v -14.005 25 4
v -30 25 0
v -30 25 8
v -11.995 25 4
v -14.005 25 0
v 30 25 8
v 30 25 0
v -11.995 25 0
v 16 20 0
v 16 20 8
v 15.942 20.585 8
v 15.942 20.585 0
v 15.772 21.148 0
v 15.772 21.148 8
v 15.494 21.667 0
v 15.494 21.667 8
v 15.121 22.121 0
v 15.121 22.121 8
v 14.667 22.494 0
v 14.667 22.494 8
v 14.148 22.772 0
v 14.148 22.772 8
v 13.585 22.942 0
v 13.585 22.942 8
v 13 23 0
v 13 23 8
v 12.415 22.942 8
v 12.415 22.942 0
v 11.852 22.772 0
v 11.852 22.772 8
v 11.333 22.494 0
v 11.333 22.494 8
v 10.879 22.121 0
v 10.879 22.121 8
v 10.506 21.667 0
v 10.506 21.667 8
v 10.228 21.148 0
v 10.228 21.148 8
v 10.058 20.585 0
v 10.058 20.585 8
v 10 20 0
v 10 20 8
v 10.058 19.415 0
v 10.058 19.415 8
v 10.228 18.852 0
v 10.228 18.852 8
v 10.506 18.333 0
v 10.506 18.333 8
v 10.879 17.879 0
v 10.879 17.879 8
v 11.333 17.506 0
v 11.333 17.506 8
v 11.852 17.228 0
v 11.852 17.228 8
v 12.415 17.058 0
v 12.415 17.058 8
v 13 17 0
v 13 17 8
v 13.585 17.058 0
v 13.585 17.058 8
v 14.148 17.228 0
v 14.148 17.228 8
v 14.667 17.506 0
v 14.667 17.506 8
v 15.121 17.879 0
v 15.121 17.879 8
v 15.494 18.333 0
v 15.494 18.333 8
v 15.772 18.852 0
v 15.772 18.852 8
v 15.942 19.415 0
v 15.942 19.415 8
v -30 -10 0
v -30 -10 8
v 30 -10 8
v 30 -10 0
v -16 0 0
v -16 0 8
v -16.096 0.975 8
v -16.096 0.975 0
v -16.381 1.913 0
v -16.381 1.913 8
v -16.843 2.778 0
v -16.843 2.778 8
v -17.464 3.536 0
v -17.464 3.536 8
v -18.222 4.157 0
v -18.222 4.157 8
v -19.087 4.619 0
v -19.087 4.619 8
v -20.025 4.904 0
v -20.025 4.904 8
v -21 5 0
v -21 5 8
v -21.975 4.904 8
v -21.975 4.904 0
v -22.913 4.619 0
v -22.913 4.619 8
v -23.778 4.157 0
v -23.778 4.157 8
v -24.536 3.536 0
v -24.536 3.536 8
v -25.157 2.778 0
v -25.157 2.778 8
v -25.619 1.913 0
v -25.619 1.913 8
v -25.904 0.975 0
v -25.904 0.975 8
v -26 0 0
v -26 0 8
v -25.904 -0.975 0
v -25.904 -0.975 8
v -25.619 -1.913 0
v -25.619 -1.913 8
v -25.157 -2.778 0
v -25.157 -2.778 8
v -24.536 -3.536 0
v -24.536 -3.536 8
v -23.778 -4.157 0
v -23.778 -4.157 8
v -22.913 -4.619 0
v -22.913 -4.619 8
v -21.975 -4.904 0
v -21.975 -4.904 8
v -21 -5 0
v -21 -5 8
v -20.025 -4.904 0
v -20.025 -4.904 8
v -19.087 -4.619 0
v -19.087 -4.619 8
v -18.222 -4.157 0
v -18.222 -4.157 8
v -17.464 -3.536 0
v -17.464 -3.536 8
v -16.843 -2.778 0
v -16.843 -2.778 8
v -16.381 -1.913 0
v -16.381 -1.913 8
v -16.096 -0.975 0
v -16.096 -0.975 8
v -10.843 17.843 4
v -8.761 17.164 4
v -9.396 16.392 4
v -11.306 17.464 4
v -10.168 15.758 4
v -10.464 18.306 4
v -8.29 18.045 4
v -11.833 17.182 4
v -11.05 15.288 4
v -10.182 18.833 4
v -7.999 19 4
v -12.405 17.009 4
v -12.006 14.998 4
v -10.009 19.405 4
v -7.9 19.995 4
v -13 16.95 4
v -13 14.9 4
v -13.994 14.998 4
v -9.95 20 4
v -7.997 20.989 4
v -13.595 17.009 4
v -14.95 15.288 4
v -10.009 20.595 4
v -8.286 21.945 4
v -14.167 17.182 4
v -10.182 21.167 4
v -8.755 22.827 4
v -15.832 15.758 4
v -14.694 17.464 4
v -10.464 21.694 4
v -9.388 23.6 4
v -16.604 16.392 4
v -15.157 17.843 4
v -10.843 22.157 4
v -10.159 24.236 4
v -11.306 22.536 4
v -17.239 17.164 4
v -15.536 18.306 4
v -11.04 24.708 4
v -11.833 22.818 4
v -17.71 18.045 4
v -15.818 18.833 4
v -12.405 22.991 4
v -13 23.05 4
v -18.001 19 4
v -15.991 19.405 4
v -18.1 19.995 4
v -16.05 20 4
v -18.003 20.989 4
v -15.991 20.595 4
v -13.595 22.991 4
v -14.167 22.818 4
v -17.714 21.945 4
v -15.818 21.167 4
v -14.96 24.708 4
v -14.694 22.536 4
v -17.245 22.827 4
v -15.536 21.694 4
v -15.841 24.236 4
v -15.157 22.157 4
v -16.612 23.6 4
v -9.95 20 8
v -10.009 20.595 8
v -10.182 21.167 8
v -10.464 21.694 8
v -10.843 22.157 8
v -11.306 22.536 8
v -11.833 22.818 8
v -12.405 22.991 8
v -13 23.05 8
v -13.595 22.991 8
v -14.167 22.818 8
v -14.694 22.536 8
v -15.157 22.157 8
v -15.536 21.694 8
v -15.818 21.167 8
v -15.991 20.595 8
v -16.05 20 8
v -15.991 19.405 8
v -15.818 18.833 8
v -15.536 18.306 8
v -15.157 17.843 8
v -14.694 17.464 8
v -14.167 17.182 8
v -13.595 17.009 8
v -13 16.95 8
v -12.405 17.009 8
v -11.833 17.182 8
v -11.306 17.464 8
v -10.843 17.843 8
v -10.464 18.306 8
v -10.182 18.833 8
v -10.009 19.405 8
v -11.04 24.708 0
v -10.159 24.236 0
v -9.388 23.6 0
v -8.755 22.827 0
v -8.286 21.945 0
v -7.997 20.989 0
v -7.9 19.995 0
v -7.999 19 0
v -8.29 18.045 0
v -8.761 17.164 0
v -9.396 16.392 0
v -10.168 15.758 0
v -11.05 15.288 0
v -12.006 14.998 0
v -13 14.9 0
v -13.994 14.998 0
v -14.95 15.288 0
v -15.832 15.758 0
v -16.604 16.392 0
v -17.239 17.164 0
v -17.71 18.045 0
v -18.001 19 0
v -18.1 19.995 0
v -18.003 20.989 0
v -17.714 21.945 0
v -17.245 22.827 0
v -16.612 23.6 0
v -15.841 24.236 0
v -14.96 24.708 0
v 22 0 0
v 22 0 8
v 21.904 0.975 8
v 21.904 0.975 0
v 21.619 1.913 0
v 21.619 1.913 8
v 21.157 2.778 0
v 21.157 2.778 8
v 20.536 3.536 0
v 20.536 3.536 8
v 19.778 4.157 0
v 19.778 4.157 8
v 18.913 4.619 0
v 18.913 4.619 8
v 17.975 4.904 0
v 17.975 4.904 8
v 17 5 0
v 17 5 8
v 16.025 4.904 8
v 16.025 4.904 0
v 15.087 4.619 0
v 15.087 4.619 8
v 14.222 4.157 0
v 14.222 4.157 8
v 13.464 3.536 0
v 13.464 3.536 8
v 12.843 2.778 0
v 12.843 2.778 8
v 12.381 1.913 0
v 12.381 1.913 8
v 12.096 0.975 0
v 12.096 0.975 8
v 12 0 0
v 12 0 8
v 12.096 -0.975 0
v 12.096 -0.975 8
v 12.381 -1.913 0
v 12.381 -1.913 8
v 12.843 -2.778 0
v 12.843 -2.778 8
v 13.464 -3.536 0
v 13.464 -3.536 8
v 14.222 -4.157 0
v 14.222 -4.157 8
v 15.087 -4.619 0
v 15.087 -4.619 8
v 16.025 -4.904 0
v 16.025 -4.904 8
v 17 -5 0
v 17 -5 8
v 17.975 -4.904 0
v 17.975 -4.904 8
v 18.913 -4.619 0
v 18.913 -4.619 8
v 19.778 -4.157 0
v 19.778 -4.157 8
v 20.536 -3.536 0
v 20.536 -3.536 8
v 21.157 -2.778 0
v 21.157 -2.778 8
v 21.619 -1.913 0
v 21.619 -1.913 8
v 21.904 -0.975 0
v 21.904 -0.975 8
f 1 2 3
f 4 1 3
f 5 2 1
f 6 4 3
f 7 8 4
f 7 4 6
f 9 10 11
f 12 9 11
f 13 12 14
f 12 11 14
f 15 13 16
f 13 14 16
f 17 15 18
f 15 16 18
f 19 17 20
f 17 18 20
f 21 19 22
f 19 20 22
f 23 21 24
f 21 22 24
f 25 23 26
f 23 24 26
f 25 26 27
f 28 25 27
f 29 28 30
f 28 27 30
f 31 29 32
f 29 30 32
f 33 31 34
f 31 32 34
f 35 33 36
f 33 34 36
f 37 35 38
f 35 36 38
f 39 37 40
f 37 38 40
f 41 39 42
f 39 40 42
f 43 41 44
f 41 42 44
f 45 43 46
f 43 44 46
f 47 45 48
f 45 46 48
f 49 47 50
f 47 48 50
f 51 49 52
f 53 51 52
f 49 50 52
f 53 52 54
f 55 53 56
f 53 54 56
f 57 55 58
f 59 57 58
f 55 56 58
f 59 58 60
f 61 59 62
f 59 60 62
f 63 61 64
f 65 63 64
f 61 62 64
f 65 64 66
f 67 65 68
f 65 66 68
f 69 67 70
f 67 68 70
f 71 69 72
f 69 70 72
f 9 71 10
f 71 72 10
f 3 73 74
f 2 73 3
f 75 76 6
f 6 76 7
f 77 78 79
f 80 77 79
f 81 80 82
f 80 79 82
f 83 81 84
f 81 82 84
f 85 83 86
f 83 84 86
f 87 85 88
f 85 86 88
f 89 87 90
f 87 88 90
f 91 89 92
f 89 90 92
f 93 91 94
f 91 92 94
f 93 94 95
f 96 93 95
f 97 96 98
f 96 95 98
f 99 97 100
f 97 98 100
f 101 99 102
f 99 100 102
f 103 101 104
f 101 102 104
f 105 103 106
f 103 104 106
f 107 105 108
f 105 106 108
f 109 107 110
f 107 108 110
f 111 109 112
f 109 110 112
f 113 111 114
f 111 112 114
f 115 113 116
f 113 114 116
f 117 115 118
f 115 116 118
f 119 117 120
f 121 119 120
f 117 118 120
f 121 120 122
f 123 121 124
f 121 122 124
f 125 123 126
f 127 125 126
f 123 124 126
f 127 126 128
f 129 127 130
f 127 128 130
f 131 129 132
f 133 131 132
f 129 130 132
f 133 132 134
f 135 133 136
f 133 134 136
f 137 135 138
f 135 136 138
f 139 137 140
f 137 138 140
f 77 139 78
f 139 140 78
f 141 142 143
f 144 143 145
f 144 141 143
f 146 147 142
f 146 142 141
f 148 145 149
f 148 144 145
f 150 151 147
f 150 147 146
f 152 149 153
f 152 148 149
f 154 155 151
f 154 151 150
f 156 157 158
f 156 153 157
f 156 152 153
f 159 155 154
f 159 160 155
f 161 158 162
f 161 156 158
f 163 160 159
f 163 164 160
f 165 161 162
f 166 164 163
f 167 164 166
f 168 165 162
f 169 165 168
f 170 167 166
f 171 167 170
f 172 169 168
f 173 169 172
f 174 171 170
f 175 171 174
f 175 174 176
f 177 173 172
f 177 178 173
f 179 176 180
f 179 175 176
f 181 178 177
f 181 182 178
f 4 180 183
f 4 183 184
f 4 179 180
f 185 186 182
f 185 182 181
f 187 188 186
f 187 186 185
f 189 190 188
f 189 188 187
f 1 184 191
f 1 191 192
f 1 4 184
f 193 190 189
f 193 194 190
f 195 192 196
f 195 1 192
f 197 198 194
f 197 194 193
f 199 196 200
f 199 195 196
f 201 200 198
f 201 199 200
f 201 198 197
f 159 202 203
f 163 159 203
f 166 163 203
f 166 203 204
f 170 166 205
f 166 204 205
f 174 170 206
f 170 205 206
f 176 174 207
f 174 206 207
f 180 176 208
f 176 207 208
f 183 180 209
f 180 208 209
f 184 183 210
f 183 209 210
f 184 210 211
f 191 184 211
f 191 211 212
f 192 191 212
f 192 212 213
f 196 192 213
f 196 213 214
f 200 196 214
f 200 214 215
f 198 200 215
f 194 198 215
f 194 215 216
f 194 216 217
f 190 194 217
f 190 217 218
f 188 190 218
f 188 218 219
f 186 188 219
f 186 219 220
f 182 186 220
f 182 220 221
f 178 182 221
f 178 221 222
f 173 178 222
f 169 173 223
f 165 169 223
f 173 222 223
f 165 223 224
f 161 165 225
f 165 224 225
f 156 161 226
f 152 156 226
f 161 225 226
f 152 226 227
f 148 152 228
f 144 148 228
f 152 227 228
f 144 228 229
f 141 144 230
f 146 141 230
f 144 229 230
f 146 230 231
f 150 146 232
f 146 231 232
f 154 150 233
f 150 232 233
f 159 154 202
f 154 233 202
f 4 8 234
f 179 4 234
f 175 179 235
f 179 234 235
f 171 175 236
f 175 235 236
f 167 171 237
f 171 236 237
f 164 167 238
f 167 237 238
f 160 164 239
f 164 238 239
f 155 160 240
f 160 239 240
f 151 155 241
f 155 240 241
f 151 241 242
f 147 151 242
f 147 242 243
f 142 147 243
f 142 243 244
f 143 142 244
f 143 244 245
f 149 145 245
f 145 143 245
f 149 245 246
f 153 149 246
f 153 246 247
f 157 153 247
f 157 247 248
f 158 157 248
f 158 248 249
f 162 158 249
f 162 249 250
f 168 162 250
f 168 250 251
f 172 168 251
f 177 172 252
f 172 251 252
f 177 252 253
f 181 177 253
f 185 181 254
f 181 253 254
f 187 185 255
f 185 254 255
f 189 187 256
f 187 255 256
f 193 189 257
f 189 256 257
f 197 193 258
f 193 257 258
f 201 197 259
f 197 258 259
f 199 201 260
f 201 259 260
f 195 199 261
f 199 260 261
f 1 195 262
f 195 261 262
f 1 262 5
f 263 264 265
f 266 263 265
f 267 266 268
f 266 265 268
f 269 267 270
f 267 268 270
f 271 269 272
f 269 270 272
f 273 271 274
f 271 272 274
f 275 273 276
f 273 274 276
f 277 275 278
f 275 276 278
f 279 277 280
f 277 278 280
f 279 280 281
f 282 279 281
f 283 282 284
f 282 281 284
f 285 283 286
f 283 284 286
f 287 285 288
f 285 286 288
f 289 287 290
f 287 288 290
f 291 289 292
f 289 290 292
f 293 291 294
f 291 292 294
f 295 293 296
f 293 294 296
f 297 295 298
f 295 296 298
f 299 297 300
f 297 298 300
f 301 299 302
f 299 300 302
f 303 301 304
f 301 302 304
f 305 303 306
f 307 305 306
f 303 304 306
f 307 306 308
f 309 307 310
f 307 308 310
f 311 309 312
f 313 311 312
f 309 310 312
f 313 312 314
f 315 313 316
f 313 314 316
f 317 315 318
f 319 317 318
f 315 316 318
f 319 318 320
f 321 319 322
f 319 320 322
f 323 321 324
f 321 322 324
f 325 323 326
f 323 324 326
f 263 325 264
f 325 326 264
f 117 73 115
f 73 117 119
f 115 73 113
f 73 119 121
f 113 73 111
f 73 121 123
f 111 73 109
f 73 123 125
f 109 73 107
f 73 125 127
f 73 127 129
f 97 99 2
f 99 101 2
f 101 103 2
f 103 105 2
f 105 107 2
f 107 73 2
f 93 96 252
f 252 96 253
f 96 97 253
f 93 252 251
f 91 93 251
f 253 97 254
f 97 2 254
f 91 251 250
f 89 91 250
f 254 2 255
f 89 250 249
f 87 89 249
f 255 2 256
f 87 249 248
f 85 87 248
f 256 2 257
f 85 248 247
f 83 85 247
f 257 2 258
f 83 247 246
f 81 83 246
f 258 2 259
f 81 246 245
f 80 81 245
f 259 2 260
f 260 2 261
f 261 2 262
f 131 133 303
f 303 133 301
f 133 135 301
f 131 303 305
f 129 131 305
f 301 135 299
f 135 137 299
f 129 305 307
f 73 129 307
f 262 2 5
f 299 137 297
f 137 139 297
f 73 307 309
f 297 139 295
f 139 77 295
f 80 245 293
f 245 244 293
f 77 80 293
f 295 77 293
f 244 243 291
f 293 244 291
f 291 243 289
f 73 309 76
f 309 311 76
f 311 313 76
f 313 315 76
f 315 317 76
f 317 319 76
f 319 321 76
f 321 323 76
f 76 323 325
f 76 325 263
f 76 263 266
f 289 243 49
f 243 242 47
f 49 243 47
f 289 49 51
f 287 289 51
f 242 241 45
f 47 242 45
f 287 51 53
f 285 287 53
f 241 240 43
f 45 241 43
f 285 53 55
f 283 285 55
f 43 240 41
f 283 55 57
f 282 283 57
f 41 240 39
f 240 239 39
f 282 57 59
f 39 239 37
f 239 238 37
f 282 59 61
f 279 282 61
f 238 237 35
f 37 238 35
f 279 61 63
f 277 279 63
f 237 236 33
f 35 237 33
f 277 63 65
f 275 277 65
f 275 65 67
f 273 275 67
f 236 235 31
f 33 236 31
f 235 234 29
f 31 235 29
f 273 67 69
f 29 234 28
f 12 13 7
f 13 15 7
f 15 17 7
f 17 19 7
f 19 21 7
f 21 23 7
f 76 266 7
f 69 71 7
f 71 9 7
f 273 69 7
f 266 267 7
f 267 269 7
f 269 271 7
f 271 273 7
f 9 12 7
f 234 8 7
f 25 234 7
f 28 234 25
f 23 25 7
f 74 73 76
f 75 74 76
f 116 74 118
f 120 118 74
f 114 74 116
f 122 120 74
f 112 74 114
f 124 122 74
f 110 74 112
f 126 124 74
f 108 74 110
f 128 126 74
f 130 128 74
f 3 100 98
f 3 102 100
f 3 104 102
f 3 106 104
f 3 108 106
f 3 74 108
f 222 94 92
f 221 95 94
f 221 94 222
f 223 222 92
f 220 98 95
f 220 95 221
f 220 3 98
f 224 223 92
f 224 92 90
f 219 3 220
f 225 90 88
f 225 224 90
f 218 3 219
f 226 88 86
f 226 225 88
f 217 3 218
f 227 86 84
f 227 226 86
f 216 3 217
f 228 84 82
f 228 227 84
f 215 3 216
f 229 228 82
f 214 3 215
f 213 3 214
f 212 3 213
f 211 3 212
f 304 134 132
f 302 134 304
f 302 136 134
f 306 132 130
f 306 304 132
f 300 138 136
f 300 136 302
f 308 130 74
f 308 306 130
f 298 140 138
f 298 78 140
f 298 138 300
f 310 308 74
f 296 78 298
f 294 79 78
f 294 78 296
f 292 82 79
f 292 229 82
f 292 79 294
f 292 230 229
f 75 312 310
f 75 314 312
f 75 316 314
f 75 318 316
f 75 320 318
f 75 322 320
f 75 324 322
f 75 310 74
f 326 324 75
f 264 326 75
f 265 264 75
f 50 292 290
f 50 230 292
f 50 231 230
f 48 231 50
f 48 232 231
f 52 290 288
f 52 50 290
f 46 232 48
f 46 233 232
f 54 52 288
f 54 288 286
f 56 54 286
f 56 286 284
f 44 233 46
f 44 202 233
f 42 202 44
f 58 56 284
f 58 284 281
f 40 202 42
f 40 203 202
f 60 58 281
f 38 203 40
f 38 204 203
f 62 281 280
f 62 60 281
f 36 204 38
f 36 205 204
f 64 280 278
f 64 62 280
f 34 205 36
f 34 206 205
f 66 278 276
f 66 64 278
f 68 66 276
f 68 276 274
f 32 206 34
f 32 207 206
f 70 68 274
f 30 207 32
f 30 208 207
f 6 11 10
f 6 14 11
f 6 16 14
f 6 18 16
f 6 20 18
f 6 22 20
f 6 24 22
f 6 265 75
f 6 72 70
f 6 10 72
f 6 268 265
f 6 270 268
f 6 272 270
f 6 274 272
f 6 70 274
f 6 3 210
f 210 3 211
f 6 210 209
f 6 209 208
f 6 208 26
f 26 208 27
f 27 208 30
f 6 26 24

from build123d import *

# Parameters (mm, degrees)
ESQUISSE2_W             = 60
ESQUISSE2_H             = 35
BASE_EXTRUSION_DEPTH    = 8
ESQUISSE4_R             = 3.05
ESQUISSE4_R_2           = 3
ESQUISSE4_R_3           = 5
ENL_V_MAT_EXTRU_1_DEPTH = 8
ESQUISSE5_R             = 5.1
ENL_V_MAT_EXTRU_2_DEPTH = 4


with BuildPart() as part:
    # Esquisse2 → Base-Extrusion (new body)
    with BuildSketch(Plane.XY):
        with Locations((0, 7.5)):
            Rectangle(ESQUISSE2_W, ESQUISSE2_H)
    extrude(amount=BASE_EXTRUSION_DEPTH)

    # Esquisse4 → Enlèv. mat.-Extru.1 (cut)
    with BuildSketch(Plane.XY.offset(8)):
        with Locations((-13, 20)):
            Circle(ESQUISSE4_R)
        with Locations((13, 20)):
            Circle(ESQUISSE4_R_2)
        with Locations((-21, 0)):
            Circle(ESQUISSE4_R_3)
        with Locations((17, 0)):
            Circle(ESQUISSE4_R_3)
    extrude(amount=-ENL_V_MAT_EXTRU_1_DEPTH, mode=Mode.SUBTRACT)

    # Esquisse5 → Enlèv. mat.-Extru.2 (cut)
    with BuildSketch(Plane(origin=(0, 0, 0), x_dir=(-1, 0, 0), z_dir=(0, 0, -1))):
        with Locations((13, 20)):
            Circle(ESQUISSE5_R)
    extrude(amount=-ENL_V_MAT_EXTRU_2_DEPTH, mode=Mode.SUBTRACT)


solid = part.part
